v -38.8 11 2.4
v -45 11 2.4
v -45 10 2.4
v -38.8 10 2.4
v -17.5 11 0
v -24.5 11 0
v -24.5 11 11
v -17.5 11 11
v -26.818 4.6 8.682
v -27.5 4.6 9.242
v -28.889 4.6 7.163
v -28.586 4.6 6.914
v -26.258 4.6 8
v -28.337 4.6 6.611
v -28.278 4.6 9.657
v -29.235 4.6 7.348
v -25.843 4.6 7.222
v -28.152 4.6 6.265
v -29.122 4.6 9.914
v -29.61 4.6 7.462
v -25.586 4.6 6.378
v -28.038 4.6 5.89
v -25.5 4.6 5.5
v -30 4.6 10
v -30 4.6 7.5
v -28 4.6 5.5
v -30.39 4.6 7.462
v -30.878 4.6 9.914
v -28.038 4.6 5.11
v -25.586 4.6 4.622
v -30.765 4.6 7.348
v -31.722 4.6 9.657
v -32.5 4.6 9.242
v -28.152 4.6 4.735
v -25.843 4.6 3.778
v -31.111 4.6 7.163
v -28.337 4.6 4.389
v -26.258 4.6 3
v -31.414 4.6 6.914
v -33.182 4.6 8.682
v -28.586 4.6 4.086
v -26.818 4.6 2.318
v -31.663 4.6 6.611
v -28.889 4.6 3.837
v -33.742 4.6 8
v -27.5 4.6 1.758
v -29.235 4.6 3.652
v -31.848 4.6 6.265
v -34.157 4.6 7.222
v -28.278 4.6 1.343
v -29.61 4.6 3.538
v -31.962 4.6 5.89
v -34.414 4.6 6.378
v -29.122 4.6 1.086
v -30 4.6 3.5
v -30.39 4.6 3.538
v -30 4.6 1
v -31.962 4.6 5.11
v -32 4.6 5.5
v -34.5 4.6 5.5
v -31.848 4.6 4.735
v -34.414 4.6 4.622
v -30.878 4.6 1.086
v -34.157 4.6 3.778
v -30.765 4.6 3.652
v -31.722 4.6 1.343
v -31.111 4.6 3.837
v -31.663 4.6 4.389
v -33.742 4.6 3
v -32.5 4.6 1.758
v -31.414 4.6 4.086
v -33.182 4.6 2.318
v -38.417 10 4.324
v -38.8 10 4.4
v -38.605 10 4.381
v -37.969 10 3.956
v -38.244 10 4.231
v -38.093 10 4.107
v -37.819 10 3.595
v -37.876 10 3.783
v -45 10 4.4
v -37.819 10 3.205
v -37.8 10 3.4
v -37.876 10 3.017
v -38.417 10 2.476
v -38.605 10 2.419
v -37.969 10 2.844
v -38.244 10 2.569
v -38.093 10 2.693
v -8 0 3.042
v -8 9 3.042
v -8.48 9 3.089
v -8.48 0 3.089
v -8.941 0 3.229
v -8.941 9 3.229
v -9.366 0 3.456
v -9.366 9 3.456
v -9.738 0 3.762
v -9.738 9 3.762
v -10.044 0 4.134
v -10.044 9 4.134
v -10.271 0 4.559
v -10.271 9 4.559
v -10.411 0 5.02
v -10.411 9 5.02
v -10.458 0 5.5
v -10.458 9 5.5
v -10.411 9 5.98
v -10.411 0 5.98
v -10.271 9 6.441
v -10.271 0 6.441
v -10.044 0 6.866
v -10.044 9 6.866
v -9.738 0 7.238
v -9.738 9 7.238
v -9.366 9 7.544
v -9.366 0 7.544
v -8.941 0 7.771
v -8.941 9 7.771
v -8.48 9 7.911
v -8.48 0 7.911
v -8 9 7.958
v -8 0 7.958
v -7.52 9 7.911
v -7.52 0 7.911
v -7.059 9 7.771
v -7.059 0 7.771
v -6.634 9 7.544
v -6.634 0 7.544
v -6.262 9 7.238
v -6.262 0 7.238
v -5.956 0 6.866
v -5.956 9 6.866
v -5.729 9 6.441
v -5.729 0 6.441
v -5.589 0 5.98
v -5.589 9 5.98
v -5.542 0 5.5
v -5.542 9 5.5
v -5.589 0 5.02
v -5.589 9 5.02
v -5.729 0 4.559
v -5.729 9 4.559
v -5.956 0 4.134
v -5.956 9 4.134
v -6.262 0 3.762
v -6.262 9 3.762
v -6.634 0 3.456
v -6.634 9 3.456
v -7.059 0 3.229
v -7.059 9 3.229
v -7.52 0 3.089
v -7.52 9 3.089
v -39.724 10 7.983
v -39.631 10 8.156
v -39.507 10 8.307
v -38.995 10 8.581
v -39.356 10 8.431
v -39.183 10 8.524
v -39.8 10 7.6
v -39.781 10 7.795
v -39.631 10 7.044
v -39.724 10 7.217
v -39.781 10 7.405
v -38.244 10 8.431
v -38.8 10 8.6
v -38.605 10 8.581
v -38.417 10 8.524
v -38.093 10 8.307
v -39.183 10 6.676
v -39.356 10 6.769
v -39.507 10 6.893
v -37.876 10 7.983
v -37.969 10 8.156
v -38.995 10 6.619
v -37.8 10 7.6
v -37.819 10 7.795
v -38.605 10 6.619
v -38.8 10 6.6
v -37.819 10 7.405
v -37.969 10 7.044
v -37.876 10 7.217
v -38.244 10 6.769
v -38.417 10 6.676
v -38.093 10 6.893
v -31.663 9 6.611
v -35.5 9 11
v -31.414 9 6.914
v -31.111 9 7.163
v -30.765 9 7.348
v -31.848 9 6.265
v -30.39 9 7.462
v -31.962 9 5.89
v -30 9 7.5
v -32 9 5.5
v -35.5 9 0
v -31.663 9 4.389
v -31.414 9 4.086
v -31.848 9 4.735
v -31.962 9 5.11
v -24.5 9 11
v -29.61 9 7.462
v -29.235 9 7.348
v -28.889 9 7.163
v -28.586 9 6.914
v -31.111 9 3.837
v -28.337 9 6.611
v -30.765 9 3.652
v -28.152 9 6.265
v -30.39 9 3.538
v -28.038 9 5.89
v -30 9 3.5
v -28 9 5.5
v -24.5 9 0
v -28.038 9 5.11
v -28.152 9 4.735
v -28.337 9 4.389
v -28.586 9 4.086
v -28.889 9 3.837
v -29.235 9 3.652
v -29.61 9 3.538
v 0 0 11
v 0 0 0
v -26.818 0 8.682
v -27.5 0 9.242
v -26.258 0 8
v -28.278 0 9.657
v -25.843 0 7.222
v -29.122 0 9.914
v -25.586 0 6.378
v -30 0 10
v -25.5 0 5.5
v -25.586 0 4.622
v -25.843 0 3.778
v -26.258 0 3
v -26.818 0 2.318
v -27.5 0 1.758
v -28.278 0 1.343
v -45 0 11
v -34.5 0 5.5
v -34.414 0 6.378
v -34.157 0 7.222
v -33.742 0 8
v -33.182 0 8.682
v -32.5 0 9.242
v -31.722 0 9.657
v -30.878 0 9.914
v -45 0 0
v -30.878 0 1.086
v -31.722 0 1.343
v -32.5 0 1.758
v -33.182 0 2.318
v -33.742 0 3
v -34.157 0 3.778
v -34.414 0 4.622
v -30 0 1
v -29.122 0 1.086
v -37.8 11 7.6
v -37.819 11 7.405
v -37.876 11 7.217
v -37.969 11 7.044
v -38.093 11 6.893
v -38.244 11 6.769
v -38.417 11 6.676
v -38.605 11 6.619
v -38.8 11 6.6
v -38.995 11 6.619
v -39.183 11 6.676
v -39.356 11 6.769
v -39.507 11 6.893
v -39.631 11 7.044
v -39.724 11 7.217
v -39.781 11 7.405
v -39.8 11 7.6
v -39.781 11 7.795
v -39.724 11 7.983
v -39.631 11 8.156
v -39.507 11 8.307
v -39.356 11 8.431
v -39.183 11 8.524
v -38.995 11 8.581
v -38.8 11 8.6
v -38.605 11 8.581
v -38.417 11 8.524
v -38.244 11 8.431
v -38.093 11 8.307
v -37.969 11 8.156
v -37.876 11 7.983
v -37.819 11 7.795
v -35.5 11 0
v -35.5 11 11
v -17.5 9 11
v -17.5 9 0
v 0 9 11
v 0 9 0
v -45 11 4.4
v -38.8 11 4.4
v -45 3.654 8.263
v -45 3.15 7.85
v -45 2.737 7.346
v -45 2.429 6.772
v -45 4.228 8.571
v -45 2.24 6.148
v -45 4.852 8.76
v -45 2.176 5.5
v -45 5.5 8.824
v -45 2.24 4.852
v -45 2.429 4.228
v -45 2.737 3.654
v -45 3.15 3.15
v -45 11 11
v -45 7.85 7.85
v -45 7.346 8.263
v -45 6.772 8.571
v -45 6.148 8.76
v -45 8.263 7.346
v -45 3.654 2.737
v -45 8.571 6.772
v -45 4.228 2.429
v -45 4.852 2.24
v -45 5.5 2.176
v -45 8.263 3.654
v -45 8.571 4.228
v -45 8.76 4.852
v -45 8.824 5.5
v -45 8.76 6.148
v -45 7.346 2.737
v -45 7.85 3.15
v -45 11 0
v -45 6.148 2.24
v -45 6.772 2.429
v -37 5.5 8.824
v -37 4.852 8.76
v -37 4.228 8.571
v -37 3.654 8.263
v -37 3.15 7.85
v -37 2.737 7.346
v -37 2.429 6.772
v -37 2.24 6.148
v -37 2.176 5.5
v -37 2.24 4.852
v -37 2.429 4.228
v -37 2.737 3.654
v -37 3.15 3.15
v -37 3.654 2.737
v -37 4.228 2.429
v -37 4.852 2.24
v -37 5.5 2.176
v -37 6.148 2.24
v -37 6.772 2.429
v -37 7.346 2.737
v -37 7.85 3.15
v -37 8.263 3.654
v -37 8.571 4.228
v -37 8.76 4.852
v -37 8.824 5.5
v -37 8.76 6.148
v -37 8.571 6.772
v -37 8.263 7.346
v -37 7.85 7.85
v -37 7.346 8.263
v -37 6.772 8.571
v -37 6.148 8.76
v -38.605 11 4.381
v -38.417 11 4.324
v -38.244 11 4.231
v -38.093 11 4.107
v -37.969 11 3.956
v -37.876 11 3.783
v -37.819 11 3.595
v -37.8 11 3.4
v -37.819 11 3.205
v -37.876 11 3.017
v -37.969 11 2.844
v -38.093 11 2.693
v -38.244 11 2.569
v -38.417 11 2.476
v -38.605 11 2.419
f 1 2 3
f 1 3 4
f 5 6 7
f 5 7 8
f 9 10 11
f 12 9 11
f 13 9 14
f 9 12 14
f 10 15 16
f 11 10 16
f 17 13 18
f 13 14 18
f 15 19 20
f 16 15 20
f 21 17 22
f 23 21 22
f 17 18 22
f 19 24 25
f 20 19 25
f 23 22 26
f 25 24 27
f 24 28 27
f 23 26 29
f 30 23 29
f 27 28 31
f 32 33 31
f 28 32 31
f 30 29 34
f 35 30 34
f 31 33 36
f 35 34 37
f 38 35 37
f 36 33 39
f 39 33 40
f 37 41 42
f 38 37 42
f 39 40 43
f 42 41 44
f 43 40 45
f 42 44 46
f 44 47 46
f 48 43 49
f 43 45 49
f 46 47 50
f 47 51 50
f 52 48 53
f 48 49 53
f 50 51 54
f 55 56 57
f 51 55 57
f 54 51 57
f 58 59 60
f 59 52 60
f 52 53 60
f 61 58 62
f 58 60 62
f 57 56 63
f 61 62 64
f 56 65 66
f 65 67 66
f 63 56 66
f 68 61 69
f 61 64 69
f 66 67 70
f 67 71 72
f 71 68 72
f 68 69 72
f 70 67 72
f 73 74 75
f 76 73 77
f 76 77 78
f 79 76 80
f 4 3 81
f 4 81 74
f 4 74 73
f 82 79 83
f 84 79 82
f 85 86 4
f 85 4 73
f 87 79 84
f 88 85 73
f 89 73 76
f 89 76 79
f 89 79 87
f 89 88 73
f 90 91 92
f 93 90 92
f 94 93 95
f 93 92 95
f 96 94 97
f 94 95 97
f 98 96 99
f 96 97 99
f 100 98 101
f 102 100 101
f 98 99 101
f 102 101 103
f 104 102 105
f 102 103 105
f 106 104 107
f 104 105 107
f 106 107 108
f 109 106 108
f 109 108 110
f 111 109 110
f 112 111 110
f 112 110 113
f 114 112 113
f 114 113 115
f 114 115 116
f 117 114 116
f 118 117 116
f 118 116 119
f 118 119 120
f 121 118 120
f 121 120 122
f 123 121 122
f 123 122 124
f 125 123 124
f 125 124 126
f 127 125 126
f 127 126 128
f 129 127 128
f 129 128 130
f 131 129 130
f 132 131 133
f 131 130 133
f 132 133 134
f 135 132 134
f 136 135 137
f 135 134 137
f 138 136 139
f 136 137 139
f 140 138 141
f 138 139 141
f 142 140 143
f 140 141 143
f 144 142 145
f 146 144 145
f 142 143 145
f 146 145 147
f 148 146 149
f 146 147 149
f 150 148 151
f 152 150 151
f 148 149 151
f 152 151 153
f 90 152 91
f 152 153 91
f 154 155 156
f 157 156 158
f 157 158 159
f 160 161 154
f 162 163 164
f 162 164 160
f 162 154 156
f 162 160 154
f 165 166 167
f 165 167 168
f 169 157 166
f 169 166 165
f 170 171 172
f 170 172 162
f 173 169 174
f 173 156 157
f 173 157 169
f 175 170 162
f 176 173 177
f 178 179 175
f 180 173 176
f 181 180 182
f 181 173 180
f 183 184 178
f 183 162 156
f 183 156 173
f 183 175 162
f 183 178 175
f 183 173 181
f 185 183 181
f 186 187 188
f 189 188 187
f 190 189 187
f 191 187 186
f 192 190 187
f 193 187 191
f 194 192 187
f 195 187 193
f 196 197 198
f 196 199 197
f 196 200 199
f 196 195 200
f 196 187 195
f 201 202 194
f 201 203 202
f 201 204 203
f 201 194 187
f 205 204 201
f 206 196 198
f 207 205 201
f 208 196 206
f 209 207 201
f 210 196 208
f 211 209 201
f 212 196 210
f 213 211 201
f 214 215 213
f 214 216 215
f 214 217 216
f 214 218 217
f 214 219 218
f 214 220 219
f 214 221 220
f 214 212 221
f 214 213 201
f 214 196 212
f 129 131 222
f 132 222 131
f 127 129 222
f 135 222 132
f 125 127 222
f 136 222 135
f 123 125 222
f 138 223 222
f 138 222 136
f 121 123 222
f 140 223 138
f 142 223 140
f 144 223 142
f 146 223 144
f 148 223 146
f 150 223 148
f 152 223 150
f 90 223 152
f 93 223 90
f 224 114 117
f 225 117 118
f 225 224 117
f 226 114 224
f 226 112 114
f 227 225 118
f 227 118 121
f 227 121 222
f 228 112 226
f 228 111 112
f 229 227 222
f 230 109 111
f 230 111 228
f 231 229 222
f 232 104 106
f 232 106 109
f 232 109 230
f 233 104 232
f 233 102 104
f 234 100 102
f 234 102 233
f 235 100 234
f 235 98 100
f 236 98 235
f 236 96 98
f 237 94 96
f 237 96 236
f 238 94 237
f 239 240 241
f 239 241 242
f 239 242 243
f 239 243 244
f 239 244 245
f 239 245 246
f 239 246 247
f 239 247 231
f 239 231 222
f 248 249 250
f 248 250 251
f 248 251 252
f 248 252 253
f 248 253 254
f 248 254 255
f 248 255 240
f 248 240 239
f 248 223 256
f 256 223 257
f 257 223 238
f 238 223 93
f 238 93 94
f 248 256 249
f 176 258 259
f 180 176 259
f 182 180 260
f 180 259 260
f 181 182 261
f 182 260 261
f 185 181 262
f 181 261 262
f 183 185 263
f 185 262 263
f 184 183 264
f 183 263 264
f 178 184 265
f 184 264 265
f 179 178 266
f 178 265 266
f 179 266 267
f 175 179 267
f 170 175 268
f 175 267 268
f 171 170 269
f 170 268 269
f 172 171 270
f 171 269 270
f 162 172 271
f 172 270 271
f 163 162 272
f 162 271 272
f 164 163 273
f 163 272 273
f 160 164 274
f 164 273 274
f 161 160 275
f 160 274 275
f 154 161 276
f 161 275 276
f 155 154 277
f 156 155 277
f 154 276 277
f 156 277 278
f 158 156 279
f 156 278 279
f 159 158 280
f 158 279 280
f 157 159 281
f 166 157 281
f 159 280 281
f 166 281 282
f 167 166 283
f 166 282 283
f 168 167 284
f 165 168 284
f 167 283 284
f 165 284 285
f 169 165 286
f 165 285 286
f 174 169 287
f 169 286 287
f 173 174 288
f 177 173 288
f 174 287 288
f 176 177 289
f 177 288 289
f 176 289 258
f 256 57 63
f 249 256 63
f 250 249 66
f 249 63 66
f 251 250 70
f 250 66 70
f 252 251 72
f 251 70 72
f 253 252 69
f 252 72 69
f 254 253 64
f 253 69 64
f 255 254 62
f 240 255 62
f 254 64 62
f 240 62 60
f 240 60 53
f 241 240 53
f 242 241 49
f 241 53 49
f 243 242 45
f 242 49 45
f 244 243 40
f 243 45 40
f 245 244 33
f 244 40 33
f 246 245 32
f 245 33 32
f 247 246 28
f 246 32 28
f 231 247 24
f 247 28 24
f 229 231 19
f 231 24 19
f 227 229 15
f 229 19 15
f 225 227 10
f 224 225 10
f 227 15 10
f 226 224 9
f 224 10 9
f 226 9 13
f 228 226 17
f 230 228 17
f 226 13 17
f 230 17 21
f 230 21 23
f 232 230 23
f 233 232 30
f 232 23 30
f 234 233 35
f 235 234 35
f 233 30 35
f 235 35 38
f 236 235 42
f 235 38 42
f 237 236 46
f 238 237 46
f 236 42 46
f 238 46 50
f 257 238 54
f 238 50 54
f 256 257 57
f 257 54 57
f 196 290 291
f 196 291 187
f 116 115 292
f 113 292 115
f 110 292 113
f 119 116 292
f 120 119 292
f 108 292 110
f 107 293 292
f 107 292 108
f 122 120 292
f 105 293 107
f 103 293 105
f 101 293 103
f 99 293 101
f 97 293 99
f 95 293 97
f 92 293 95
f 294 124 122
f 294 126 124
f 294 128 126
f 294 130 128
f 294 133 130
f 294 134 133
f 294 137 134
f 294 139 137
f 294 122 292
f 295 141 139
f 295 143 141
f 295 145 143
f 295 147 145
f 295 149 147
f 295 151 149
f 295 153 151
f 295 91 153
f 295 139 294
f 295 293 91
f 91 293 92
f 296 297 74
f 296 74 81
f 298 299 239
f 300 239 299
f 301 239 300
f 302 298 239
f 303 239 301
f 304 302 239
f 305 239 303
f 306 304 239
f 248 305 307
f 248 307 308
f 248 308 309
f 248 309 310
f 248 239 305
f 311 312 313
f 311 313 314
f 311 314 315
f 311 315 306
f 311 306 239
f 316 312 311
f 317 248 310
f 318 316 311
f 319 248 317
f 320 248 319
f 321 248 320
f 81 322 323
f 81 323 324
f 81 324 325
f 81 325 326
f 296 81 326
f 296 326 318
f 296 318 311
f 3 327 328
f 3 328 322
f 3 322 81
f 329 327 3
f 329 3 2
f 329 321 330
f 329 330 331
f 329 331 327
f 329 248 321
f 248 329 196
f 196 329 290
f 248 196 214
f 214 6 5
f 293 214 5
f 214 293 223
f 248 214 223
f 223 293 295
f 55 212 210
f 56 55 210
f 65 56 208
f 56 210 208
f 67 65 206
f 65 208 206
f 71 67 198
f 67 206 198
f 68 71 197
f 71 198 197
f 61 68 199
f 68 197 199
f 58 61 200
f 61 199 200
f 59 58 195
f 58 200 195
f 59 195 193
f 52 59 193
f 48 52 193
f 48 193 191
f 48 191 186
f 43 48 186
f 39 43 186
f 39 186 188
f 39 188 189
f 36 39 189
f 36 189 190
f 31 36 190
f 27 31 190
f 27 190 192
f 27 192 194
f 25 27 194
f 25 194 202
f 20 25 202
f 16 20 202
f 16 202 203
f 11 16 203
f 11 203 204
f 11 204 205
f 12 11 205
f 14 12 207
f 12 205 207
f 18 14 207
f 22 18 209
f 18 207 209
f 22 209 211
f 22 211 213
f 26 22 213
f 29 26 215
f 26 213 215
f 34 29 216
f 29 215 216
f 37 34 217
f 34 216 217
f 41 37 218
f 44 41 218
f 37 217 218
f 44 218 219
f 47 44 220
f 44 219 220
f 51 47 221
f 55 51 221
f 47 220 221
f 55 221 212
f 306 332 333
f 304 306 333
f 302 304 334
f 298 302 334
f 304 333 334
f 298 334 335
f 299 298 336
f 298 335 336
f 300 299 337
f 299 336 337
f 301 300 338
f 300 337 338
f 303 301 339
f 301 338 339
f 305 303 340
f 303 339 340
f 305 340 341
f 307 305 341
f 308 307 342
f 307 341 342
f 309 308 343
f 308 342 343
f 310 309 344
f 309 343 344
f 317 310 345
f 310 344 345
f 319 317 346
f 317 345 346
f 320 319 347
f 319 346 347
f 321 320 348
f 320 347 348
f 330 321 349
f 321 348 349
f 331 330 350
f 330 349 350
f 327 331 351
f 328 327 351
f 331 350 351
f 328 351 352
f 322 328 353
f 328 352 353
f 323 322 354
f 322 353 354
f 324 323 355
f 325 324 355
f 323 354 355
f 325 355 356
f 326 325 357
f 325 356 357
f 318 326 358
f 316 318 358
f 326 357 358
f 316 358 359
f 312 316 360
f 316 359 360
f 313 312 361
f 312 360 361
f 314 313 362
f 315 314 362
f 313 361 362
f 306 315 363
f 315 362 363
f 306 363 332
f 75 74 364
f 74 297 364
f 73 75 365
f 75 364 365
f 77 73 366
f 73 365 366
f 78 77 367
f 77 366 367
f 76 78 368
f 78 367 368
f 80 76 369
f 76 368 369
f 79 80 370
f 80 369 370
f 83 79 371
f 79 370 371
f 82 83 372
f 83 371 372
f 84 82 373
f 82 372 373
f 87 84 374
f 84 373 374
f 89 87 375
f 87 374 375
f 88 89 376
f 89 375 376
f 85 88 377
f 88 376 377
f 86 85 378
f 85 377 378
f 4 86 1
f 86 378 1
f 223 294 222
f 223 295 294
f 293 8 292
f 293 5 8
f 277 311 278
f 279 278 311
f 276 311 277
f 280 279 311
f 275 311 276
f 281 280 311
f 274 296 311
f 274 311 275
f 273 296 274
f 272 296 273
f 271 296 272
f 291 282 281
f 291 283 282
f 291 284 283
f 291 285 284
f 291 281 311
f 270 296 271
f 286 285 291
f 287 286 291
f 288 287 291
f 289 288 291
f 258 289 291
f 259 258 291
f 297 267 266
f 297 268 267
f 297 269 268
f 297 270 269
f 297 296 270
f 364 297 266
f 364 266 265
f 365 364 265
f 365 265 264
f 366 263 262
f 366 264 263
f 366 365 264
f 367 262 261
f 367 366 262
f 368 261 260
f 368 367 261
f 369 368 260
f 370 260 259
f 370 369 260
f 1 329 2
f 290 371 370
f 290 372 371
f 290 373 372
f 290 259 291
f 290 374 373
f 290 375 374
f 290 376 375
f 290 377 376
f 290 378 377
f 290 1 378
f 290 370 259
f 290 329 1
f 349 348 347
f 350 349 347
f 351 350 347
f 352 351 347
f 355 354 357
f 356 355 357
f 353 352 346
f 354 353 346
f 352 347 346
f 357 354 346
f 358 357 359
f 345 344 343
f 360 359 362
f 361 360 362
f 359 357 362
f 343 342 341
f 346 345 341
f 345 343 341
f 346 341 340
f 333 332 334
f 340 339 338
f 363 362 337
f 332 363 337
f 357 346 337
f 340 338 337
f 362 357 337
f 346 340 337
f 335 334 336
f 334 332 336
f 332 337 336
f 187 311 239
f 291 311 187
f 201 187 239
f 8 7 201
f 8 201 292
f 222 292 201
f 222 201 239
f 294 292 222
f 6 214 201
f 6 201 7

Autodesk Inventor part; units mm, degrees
ref_plane "YZ Plane" through (0, 0, 0) normal (1, 0, 0) x (0, 1, 0)
ref_plane "XZ Plane" through (0, 0, 0) normal (0, 1, 0) x (-1, 0, 0)
ref_plane "XY Plane" through (0, 0, 0) normal (0, 0, 1) x (1, 0, 0)
sketch "Boceto1" plane through (0, 0, 0) normal (0, 0, 1) x (1, 0, 0)
  line L0 (0, 0) -> (-45, 0)
  line L1 (-45, 0) -> (-45, 11)
  line L2 (0, 9) -> (0, 0)
  line L3 (-35.5, 11) -> (-35.5, 9)
  line L4 (-35.5, 9) -> (-24.5, 9)
  line L5 (-24.5, 9) -> (-24.5, 11)
  line L6 (-17.5, 11) -> (-17.5, 9)
  line L7 (-17.5, 9) -> (0, 9)
  line L8 (-45, 11) -> (-35.5, 11)
  line L9 (-24.5, 11) -> (-17.5, 11)
  dimension "d0" = 9
  dimension "d1" = 11
  dimension "d2" = 9.5
  dimension "d3" = 7
  dimension "d4" = 17.5
  dimension "d5" = 11
  dimension "d6" = 2
  dimension "d7" = 2
extrude "Extrusión1" add sketch "Boceto1" along normal blind 11
sketch "Boceto2" plane through (-45, 0, 0) normal (0, -1, 0) x (1, 0, 0)
  line L0 (0, 0) -> (45, 0) projected
  line L1 (45, 0) -> (45, 11) projected
  line L2 (0, 11) -> (45, 11) projected
  line L3 (0, 0) -> (0, 11) projected
  line L4 (45, 5.5) -> (0, 5.5) construction
  line L5 (45, 11) -> (27.5, 11) projected
  line L6 (37, 11) -> (37, 0) construction
  line L7 (15, 11) -> (15, 0) construction
  line L8 (0, 0) -> (45, 0) projected
  circle A0 centre (37, 5.5) radius 2.85
  circle A1 centre (15, 5.5) radius 4.5
  circle A2 centre (15, 5.5) radius 2
  dimension "d10" = 8
  dimension "d11" = 22
  dimension "d12" = 9
  dimension "d13" = 4
  dimension "d14" = 5.7
hole "Agujero1" at (-8, 0, 5.5) direction (0, 1, 0) diameter 4.917 end through all thread size "M6x1" class "6H" standard "ANSI Metric M Profile"
hole "Agujero2" at (-30, 0, 5.5) direction (0, 1, 0) diameter 4 end through all counterbore diameter 9 counterbore depth 4.6
sketch "Boceto3" plane through (-45, 11, 0) normal (0, 1, 0) x (1, 0, 0)
  line L0 (9.5, 0) -> (0, 0) projected
  line L1 (0, 0) -> (0, -11) projected
  line L2 (9.5, -11) -> (0, -11) projected
  line L3 (9.5, 0) -> (9.5, -11) projected
  line L4 (6.2, -3.4) -> (-0.5191, -3.4) construction
  line L5 (6.2, -4.4) -> (-0.5191, -4.4)
  line L6 (-0.5191, -2.4) -> (6.2, -2.4)
  arc A0 (6.2, -4.4) -> (6.2, -2.4) centre (6.2, -3.4) ccw
  arc A1 (-0.5191, -2.4) -> (-0.5191, -4.4) centre (-0.5191, -3.4) ccw
  line L7 (9.5, -5.5) -> (0, -5.5) construction
  circle A2 centre (6.2, -7.6) radius 1
  point P0 (45, 0)
  point P1 (2.8405, -3.4)
  dimension "d29" = 2.1
  dimension "d30" = 2
  dimension "d31" = 6.2
  dimension "d32" = 2.1
  dimension "d33" = 2
  dimension "d34" = 6.2
extrude "Extrusión2" cut sketch "Boceto3" against normal blind 1 contours L6 A0 L5 L1 | L1 L5 A1 L6 | A2
sketch "Boceto4" plane through (-45, 0, 0) normal (-1, 0, 0) x (0, 0, 1)
  line L0 (4.4, 11) -> (4.4, 10) projected
  line L1 (4.4, 10) -> (2.4, 10) projected
  line L2 (2.4, 10) -> (2.4, 11) projected
  line L3 (0, 11) -> (2.4, 11) projected
  line L4 (0, 11) -> (0, 0) projected
  line L5 (0, 0) -> (11, 0) projected
  line L6 (11, 11) -> (11, 0) projected
  line L7 (4.4, 11) -> (11, 11) projected
  line L8 (11, 5.5) -> (0, 5.5) construction
  line L9 (0, 11) -> (0, 0) projected
  line L10 (5.5, 0) -> (5.5, 11) construction
  point P0 (5.5, 5.5)
hole "Agujero3" at (-45, 5.5, 5.5) direction (1, 0, 0) diameter 6.647 depth 8 thread size "M8x1.25" class "6H" standard "ANSI Metric M Profile"
properties part number "Hudson 1-55"
